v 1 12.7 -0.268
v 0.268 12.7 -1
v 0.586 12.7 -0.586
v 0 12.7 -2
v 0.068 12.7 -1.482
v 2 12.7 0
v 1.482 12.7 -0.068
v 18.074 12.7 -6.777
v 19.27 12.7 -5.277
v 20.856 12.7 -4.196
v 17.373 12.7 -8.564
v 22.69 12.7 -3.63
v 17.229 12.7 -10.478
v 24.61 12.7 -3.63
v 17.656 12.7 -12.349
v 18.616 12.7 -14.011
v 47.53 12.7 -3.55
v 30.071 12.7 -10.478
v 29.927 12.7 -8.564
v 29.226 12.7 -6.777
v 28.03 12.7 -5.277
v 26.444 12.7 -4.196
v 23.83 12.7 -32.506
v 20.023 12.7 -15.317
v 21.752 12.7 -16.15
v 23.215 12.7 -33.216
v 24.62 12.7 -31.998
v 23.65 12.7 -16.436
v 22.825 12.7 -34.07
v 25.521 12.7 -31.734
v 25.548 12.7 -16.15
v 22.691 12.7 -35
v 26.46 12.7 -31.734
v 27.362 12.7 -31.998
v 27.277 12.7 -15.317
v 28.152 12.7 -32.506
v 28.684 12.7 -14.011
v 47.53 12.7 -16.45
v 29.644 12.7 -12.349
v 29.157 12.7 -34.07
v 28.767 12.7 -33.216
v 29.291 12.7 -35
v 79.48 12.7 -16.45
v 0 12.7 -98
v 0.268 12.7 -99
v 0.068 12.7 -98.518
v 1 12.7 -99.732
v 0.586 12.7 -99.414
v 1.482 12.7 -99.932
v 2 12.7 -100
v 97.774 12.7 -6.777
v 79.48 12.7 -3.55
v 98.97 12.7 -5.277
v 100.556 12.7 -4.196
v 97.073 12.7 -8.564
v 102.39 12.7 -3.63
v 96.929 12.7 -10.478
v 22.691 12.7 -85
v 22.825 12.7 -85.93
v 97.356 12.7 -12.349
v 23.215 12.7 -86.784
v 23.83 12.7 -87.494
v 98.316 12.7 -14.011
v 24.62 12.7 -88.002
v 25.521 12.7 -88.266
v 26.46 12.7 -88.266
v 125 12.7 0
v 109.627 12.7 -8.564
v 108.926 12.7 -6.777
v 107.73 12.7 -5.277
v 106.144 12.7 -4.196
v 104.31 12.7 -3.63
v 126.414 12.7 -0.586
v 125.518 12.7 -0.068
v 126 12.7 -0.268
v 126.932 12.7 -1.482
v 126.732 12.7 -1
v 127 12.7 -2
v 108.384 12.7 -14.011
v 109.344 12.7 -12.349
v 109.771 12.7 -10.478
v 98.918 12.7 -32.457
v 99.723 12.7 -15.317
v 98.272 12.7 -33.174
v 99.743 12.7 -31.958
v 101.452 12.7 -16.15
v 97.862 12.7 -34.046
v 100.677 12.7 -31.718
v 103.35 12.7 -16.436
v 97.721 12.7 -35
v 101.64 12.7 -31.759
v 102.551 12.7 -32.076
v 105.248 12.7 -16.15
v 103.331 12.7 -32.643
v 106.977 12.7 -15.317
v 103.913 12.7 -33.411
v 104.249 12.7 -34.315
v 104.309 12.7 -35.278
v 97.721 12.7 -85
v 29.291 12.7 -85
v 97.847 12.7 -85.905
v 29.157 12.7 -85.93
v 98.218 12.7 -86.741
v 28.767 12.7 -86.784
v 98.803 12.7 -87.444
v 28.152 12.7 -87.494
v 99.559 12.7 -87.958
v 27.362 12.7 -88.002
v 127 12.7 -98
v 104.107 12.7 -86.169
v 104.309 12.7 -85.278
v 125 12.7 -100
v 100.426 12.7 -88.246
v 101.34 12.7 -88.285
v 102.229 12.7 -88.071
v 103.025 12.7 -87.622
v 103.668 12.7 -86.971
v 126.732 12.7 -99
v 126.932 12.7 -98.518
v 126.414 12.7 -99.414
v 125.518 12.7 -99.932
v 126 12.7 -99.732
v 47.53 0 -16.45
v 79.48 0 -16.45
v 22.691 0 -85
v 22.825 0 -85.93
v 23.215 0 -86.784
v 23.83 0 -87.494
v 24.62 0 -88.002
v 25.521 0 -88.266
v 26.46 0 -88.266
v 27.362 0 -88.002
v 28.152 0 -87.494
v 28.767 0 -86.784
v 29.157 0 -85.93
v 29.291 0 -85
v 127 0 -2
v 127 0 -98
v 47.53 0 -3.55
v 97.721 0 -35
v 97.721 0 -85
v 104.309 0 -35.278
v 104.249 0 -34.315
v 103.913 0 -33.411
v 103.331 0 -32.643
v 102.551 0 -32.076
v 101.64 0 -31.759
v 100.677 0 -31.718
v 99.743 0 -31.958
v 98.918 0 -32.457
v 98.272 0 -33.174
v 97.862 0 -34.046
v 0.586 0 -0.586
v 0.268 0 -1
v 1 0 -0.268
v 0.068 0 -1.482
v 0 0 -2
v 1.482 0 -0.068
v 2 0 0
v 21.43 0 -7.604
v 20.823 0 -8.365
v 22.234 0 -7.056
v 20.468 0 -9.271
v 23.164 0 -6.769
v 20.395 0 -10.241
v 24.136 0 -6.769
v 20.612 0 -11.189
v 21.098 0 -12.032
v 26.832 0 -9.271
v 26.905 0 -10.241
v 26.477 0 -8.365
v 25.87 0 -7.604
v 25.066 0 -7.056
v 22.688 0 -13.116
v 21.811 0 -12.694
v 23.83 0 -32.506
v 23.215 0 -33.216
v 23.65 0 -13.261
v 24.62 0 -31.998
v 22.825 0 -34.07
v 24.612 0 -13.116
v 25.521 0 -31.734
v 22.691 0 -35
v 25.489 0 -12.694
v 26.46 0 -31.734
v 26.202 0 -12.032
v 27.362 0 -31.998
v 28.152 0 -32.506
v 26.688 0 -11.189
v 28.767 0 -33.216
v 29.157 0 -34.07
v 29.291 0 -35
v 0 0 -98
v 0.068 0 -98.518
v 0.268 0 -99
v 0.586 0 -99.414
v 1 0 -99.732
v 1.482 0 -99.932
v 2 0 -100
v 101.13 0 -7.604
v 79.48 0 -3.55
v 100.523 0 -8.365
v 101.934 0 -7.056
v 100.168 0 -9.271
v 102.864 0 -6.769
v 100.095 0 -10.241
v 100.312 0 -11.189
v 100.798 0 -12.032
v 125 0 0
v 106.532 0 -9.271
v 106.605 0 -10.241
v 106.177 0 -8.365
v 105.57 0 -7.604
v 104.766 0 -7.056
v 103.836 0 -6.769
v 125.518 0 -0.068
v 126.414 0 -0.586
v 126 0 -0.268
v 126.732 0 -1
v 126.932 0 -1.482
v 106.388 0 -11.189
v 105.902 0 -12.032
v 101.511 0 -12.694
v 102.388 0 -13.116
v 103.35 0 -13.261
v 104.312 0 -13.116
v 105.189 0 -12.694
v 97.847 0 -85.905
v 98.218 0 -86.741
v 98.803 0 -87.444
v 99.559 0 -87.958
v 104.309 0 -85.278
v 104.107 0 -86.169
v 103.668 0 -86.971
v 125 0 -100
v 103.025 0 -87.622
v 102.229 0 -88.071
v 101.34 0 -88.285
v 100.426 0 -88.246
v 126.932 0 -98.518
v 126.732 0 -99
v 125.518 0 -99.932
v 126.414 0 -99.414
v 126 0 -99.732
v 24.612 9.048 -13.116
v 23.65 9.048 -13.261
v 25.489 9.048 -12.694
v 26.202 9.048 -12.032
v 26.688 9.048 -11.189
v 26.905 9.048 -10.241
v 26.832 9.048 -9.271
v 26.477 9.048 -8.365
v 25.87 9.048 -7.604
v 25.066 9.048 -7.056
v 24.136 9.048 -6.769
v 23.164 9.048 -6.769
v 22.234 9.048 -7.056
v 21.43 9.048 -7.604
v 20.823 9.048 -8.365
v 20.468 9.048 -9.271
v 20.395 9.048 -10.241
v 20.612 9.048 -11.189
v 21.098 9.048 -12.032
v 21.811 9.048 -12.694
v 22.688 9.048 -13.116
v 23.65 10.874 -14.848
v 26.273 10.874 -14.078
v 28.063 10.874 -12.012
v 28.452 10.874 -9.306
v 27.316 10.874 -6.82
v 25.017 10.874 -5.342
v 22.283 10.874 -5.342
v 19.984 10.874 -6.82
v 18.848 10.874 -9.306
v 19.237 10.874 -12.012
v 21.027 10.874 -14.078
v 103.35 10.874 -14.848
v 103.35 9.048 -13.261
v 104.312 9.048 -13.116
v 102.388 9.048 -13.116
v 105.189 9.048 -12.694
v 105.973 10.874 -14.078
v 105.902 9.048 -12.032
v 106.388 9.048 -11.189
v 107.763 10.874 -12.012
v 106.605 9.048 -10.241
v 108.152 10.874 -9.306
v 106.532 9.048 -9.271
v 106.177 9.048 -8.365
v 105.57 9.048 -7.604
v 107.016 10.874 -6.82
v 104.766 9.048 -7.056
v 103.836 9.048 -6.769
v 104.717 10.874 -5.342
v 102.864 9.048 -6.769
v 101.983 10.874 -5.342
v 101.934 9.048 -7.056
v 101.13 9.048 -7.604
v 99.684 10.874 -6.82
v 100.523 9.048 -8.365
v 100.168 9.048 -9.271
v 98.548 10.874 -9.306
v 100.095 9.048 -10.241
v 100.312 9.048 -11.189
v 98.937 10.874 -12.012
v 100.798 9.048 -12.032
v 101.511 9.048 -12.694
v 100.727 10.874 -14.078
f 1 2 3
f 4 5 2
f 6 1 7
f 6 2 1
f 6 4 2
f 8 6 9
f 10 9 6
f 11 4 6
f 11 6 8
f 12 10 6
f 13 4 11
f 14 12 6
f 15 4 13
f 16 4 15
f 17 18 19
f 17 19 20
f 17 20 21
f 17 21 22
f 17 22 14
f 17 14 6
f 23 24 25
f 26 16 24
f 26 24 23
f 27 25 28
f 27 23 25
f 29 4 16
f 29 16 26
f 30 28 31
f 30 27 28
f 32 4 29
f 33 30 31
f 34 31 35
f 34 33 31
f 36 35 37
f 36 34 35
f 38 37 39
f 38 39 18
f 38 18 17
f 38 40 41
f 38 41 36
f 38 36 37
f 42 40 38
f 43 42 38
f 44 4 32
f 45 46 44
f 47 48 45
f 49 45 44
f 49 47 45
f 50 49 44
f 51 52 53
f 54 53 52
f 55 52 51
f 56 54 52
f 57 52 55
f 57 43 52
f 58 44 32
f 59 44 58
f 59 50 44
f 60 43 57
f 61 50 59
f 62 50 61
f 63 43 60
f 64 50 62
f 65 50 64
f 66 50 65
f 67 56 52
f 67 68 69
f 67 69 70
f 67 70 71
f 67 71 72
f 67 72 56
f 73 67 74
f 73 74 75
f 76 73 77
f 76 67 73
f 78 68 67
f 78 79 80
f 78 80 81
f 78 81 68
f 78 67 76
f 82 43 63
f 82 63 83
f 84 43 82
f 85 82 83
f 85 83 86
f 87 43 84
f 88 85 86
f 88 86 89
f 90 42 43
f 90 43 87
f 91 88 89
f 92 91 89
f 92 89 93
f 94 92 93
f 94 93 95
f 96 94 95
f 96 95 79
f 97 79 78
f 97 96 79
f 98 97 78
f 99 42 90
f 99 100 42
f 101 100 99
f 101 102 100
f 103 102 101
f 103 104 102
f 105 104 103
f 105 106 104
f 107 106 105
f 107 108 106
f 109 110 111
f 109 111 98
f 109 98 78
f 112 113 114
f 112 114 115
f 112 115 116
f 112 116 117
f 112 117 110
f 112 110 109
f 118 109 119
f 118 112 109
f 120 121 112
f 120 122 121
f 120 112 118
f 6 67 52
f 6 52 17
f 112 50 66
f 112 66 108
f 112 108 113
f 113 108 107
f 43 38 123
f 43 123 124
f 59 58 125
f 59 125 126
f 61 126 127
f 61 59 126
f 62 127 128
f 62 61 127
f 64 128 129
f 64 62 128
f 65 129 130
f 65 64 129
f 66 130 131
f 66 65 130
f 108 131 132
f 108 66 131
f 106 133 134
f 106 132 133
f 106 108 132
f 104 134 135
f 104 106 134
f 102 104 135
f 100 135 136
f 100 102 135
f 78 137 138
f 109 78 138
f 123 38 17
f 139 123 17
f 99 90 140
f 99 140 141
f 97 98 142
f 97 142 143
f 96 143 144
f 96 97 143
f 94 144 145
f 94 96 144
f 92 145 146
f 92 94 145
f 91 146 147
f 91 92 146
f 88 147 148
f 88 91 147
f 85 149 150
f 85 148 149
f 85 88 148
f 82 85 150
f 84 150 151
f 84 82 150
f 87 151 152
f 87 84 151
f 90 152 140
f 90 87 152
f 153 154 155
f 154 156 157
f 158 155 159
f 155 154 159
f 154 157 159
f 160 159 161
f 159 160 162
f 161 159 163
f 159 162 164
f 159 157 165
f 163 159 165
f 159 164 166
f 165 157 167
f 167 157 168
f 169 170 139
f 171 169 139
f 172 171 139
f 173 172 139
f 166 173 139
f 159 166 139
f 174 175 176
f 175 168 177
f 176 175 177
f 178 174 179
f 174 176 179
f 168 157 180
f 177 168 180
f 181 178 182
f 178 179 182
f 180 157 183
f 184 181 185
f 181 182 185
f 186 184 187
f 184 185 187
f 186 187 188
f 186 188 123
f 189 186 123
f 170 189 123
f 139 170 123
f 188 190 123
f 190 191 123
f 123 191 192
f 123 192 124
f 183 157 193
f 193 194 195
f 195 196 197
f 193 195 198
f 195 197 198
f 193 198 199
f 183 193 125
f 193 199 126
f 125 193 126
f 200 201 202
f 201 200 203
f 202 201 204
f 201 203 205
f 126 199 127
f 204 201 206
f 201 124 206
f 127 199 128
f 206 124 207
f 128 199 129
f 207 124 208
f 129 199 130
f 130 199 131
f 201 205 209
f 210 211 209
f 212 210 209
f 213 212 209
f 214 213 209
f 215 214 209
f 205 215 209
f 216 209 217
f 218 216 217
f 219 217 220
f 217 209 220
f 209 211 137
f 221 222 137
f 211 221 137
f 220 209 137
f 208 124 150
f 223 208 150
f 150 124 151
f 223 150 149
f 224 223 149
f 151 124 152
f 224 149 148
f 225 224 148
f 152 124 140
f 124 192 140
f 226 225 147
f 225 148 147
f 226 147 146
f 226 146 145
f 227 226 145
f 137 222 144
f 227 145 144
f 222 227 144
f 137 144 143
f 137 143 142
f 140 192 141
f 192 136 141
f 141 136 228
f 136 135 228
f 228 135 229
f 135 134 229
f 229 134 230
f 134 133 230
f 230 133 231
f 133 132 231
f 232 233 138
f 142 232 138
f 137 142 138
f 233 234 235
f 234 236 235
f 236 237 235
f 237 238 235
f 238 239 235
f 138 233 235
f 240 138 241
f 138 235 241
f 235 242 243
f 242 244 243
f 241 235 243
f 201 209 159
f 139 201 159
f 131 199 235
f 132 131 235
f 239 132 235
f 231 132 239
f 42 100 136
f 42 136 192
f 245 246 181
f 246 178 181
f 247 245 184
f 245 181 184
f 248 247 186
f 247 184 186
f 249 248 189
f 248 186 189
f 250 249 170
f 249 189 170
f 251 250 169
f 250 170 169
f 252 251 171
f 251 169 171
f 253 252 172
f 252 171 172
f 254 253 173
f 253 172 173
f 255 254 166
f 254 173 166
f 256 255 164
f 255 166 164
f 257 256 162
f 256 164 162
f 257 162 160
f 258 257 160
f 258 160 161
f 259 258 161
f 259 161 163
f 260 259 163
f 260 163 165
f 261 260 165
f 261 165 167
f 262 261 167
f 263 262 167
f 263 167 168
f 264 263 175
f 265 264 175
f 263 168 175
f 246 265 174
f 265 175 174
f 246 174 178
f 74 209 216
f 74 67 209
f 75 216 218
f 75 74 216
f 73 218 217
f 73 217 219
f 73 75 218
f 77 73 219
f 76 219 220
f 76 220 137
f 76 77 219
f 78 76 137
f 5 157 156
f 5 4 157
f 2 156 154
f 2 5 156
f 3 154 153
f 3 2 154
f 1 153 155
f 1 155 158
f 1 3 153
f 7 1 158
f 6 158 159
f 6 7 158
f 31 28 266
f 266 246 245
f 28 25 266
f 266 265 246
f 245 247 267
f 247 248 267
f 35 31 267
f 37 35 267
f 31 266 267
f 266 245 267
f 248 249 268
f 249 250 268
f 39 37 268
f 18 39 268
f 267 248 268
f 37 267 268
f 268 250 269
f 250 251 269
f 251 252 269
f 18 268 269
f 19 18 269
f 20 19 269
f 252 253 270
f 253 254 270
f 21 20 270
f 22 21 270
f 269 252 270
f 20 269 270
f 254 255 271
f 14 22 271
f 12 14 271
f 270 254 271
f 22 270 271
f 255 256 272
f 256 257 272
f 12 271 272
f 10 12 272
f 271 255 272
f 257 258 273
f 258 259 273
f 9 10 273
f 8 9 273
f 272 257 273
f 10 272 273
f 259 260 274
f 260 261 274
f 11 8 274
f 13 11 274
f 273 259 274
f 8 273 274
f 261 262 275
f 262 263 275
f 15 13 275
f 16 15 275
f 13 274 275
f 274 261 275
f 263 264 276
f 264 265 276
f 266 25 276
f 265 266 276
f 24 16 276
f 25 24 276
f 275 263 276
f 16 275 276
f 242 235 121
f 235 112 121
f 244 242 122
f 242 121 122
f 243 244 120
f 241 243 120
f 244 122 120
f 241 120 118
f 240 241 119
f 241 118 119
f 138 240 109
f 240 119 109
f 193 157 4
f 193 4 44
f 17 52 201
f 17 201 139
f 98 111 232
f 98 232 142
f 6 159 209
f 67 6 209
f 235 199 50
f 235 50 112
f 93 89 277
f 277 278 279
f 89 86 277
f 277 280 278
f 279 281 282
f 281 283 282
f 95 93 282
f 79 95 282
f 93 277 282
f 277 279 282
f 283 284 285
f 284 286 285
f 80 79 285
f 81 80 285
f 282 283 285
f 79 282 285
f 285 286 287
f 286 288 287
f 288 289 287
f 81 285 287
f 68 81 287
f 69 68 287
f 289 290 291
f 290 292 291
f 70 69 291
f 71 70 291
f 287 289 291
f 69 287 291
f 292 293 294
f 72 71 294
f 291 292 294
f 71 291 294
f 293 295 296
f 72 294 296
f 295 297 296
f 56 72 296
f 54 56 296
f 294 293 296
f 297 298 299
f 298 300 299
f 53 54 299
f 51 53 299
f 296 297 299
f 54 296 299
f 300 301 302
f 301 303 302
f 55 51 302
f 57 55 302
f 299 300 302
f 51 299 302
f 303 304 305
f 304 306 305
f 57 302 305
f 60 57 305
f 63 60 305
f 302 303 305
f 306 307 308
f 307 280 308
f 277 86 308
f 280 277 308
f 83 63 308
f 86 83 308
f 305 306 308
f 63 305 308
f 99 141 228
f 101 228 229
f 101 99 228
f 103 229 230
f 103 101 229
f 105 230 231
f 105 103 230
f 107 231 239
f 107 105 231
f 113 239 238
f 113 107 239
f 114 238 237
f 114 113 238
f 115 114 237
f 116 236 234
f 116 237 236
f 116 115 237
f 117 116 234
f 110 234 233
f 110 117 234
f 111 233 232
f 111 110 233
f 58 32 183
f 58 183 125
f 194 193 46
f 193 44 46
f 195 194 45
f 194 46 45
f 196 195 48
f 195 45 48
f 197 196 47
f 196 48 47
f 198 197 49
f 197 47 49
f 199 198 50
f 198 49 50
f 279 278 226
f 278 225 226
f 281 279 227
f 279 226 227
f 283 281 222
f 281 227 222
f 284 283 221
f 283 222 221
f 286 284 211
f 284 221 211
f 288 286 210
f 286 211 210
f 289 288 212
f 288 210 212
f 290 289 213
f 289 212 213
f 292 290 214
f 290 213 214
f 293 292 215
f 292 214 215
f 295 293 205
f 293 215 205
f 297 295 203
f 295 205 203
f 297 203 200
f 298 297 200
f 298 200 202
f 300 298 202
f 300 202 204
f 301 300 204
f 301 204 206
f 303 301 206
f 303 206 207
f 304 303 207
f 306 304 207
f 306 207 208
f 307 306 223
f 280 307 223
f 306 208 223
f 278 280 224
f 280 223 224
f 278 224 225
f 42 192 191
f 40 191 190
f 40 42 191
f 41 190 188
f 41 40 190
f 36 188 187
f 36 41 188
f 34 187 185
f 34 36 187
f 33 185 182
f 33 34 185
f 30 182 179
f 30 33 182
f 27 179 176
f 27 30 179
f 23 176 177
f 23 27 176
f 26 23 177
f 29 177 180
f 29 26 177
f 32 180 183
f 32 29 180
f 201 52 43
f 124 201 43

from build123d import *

# Parameters (mm, degrees)
SKETCH1_W                                        = 127
SKETCH1_H                                        = 100
BOSS_EXTRUDE1_DEPTH                              = 12.7
CUT_EXTRUDE1_DEPTH                               = 12.7
CUT_EXTRUDE2_DEPTH                               = 163.142807426
FILLET1_R                                        = 2
CSK_FOR_1_4_FLAT_HEAD_MACHINE_SCREW1_D           = 6.5278
CSK_FOR_1_4_FLAT_HEAD_MACHINE_SCREW1_CSINK_D     = 12.8778
CSK_FOR_1_4_FLAT_HEAD_MACHINE_SCREW1_CSINK_ANGLE = 82


with BuildPart() as part:
    # Sketch1 → Boss-Extrude1 (new body)
    with BuildSketch(Plane(origin=(0, 0, 0), x_dir=(1, 0, 0), z_dir=(0, 1, 0))):
        with Locations((63.5, 50)):
            Rectangle(SKETCH1_W, SKETCH1_H)
    extrude(amount=BOSS_EXTRUDE1_DEPTH)

    # Sketch2 → Cut-Extrude1 (cut)
    with BuildSketch(Plane(origin=(0, 12.7, 0), x_dir=(1, 0, 0), z_dir=(0, 1, 0))):
        Polygon((47.53, 10), (47.53, 16.45), (79.48, 16.45), (79.48, 10), (79.48, 3.55), (47.53, 3.55), align=None)
    extrude(amount=-CUT_EXTRUDE1_DEPTH, mode=Mode.SUBTRACT)

    # Sketch6 → Cut-Extrude2 (cut, through all)
    with BuildSketch(Plane(origin=(0, 12.7, 0), x_dir=(1, 0, 0), z_dir=(0, 1, 0))):
        with BuildLine():
            Line((22.690847092, 35), (22.690847092, 85))
            ThreePointArc((22.690847092, 85), (25.990847092, 88.3), (29.290847092, 85))
            Line((29.290847092, 85), (29.290847092, 35))
            ThreePointArc((29.290847092, 35), (25.990847092, 31.7), (22.690847092, 35))
        make_face()
        with BuildLine():
            Line((97.720847092, 35.000004619), (97.720847092, 84.999995381))
            ThreePointArc((97.720847092, 84.999995381), (100.881876157, 88.297072501), (104.30914268, 85.2776907))
            Line((104.30914268, 85.2776907), (104.30914268, 35.2776907))
            ThreePointArc((104.30914268, 35.2776907), (101.159813412, 31.702927304), (97.720847092, 35.000004619))
        make_face()
    extrude(amount=-CUT_EXTRUDE2_DEPTH, mode=Mode.SUBTRACT)

    # Fillet1
    fillet1_edges = [part.edges().sort_by_distance(p)[0] for p in [
        (0, 6.35, -100),
        (127, 6.35, -100),
        (127, 6.35, 0),
        (0, 6.35, 0),
    ]]
    fillet(fillet1_edges, radius=FILLET1_R)

    # CSK for 1/4 Flat Head Machine Screw1 (through all)
    with Locations(Plane(origin=(23.65, 12.7, -9.996892397), x_dir=(0, 0, 1), z_dir=(0, 1, 0))):
        with Locations((0, 0), (0, 79.7)):
            CounterSinkHole(CSK_FOR_1_4_FLAT_HEAD_MACHINE_SCREW1_D / 2, CSK_FOR_1_4_FLAT_HEAD_MACHINE_SCREW1_CSINK_D / 2, counter_sink_angle=CSK_FOR_1_4_FLAT_HEAD_MACHINE_SCREW1_CSINK_ANGLE)


solid = part.part
